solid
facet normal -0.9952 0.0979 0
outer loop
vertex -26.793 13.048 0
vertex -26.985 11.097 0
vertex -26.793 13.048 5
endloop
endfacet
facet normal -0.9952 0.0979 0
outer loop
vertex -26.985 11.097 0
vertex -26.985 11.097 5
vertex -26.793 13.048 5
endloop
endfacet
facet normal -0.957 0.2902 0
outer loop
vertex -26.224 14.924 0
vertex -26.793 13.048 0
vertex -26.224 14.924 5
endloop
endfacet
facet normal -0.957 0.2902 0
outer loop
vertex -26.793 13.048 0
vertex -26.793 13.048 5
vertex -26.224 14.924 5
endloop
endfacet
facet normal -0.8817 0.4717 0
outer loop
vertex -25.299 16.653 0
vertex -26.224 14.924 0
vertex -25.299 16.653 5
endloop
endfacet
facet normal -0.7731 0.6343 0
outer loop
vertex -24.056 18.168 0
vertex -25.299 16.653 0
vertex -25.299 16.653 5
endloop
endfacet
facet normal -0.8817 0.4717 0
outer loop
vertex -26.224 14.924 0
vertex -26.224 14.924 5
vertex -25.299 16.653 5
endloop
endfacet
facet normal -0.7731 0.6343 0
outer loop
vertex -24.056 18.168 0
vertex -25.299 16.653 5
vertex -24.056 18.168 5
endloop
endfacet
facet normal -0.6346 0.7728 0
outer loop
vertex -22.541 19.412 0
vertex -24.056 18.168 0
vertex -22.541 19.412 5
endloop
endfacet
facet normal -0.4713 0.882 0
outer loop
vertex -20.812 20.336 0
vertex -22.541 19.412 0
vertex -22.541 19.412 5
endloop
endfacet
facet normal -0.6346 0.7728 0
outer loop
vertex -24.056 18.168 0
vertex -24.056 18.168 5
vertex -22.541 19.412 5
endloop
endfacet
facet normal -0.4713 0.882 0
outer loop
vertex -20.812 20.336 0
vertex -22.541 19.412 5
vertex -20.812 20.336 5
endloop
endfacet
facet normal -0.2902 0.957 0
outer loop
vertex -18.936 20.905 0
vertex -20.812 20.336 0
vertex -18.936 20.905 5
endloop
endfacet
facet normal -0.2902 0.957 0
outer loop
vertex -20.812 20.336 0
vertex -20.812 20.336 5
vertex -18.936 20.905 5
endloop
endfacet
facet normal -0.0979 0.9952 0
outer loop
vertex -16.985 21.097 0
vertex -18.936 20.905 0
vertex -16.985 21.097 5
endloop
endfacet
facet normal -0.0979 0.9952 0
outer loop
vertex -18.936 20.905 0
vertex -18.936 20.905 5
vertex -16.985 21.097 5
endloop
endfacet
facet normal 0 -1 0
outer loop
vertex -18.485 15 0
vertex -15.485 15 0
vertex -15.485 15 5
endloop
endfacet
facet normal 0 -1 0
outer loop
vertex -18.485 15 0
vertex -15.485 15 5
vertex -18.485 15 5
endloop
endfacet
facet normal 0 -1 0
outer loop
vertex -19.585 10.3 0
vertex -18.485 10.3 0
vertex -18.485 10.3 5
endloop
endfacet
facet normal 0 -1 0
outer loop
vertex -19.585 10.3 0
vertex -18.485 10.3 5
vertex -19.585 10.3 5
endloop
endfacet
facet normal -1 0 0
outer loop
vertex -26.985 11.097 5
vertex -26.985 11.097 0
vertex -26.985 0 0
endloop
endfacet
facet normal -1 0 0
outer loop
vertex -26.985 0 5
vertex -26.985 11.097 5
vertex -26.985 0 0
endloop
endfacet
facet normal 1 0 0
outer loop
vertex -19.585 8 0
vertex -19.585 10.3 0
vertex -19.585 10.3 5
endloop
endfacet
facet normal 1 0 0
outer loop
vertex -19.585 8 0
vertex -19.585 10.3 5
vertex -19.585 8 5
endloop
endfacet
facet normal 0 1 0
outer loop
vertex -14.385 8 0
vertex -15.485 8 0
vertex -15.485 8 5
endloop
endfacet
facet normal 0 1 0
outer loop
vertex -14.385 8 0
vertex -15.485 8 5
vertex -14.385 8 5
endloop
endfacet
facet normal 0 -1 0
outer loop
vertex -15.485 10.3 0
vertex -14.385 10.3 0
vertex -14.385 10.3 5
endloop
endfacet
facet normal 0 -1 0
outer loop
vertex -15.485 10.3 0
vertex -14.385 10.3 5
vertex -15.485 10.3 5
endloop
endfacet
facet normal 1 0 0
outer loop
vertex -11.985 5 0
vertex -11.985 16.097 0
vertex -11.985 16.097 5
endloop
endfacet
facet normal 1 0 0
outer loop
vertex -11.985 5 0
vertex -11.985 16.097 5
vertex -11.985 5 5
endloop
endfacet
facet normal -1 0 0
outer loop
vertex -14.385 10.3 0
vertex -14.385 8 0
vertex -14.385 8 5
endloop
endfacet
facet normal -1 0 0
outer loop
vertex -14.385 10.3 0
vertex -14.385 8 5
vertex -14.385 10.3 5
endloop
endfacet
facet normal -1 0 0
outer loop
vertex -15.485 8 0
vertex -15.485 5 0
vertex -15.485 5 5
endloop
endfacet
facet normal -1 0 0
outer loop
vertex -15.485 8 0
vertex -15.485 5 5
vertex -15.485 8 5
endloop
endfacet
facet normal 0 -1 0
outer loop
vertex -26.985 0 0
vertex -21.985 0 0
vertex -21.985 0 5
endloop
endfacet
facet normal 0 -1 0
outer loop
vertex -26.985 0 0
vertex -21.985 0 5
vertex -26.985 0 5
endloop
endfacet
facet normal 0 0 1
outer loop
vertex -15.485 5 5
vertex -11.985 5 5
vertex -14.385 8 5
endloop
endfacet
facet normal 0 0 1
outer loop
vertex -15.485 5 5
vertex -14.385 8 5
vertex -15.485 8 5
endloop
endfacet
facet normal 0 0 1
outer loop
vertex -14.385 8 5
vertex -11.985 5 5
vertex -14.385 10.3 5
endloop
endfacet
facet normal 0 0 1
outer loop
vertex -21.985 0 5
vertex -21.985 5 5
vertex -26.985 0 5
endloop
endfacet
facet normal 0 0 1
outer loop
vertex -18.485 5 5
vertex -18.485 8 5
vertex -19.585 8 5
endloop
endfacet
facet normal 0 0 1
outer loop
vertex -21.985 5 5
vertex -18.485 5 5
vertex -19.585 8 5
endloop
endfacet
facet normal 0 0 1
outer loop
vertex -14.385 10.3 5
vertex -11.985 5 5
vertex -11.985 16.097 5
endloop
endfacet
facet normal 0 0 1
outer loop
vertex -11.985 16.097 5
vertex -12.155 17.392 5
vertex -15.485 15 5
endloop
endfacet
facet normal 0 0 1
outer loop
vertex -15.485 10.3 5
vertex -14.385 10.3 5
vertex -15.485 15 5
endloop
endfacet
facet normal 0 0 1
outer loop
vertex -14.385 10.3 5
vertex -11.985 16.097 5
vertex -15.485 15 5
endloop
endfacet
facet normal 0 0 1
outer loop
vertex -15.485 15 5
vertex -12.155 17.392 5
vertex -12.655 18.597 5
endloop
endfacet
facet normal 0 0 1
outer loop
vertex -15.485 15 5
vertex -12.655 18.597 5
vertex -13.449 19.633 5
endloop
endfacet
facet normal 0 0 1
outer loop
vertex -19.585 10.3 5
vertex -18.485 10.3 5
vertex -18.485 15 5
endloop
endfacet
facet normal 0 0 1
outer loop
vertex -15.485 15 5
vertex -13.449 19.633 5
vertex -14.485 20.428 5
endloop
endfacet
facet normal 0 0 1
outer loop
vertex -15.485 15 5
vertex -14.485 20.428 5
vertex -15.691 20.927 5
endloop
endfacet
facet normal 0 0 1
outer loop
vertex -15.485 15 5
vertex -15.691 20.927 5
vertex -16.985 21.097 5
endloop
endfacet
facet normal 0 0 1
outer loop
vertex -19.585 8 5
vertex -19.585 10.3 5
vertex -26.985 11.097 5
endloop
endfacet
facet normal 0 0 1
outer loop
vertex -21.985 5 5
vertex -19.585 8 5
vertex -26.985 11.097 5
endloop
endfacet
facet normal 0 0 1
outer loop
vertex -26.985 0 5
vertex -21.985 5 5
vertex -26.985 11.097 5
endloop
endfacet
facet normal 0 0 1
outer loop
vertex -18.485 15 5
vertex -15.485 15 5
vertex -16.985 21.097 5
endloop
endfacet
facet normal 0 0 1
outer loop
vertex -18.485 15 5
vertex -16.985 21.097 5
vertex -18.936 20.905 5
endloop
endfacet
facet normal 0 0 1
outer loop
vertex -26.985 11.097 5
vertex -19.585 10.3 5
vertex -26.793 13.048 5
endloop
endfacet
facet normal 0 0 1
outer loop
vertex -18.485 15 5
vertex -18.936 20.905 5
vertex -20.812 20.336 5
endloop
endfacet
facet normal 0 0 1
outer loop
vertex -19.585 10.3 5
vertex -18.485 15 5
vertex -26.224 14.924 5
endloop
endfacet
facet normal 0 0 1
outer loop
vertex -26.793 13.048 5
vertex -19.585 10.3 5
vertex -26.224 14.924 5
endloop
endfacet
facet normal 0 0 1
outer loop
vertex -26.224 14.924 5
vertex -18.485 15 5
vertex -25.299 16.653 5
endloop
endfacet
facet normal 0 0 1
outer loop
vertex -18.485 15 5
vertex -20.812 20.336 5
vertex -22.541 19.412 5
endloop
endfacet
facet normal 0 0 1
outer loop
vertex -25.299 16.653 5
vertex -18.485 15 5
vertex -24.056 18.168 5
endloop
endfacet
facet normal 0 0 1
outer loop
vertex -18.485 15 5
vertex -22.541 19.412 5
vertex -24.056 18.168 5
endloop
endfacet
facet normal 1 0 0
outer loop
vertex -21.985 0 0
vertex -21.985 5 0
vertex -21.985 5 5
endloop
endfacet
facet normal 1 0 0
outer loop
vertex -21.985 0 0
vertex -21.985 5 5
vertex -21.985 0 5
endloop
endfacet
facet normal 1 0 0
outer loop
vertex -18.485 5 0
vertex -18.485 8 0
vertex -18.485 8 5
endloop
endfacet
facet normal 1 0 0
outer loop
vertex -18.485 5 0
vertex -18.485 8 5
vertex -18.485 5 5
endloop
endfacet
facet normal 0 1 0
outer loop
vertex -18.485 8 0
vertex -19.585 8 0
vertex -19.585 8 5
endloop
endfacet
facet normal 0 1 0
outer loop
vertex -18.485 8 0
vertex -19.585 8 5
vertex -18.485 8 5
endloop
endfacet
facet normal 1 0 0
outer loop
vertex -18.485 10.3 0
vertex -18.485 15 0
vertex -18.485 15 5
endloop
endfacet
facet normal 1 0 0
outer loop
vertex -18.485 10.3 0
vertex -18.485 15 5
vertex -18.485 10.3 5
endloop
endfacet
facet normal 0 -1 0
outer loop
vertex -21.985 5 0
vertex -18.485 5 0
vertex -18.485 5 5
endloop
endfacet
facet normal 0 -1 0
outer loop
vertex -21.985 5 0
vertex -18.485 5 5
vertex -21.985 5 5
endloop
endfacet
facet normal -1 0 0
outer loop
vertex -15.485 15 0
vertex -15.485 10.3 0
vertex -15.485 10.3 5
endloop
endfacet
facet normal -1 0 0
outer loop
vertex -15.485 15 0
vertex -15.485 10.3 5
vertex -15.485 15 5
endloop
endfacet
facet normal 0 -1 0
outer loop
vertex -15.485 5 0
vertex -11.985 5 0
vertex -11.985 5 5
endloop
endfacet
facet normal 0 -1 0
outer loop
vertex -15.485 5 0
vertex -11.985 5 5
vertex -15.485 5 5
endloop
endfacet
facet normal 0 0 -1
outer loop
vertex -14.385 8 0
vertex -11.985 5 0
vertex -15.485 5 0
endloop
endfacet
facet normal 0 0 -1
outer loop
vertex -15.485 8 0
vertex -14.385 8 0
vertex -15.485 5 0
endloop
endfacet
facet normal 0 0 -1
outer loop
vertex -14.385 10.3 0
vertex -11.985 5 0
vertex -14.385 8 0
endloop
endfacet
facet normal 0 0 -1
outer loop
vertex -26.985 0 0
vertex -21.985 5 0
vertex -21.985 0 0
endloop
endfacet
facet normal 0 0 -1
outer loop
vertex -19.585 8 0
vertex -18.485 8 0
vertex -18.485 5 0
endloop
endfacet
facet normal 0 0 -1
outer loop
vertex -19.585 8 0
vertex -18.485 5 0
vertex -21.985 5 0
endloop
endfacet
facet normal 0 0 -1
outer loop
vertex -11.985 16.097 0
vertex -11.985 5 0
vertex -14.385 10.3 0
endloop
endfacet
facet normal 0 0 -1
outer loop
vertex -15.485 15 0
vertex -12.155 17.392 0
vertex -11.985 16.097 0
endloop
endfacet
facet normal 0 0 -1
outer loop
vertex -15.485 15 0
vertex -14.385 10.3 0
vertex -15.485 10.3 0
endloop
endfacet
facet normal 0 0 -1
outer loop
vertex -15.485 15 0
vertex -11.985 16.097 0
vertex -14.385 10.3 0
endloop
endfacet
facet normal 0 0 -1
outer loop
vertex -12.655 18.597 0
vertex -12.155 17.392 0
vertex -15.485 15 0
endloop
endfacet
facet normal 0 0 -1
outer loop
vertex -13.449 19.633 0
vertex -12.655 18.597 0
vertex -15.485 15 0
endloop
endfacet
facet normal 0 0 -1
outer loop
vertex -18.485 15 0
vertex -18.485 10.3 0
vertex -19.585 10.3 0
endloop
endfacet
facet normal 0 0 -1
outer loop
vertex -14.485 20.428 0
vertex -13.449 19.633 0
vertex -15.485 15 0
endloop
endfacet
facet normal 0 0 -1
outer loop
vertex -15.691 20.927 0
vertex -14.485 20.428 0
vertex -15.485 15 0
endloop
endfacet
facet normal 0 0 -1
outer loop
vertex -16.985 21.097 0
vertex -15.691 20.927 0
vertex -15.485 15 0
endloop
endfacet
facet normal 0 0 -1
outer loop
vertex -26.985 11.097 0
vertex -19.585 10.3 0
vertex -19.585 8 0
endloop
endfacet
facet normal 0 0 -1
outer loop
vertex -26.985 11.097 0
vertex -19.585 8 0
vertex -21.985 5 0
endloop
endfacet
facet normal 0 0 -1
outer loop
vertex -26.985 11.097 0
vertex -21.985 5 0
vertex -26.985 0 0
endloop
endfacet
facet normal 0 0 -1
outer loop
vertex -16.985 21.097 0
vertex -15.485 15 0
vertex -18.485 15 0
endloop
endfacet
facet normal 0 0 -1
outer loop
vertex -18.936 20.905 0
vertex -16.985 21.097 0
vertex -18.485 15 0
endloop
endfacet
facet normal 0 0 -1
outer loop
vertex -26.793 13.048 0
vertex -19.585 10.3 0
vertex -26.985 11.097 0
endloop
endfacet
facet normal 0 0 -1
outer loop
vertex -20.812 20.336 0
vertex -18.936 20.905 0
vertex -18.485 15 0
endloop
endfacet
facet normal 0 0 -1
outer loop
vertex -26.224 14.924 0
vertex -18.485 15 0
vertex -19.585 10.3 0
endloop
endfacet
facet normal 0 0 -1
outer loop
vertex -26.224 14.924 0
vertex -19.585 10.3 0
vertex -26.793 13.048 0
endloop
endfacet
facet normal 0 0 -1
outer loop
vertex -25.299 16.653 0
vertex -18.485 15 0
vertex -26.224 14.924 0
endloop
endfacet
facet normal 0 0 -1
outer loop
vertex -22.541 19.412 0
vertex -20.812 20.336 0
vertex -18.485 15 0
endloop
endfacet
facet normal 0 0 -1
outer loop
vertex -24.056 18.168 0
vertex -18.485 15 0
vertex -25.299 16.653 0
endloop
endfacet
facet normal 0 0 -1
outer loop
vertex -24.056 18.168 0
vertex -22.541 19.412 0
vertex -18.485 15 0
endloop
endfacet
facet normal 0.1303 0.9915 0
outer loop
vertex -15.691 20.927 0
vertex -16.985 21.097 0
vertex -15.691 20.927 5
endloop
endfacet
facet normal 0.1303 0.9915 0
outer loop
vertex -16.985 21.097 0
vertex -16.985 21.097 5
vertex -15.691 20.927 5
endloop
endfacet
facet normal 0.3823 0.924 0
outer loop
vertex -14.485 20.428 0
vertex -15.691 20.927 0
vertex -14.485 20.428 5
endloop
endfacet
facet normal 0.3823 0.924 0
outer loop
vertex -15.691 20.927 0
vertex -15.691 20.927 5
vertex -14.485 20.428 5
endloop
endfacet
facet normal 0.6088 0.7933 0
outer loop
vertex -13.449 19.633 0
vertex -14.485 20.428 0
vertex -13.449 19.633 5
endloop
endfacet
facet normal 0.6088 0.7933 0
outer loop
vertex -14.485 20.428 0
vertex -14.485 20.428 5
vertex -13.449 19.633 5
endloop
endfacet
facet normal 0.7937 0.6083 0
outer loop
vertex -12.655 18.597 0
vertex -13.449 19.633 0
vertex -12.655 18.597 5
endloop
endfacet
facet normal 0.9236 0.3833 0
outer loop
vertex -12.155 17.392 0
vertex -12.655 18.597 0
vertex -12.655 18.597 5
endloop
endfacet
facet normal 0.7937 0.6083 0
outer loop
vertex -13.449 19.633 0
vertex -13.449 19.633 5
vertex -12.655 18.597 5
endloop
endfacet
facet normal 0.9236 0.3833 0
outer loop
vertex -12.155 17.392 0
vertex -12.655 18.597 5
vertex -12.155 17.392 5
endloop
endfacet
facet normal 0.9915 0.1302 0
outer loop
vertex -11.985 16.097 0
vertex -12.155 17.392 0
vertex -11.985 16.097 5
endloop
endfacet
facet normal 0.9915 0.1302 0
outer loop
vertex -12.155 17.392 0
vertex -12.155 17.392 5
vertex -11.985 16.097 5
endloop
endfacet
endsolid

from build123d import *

# Parameters (mm, degrees)
BOSS_EXTRUDE1_DEPTH = 5
FILLET1_R           = 10
FILLET2_R           = 5


with BuildPart() as part:
    # Sketch1 → Boss-Extrude1 (new body)
    with BuildSketch(Plane.XY):
        Polygon((-18.484799863, 5), (-21.984799863, 5), (-21.984799863, 0), (-26.984799863, 0), (-26.984799863, 5), (-26.984799863, 21.097384909), (-11.984799863, 21.097384909), (-11.984799863, 5), (-15.484799863, 5), (-15.484799863, 8), (-14.384799863, 8), (-14.384799863, 10.3), (-15.484799863, 10.3), (-15.484799863, 15), (-18.484799863, 15), (-18.484799863, 10.3), (-19.584799863, 10.3), (-19.584799863, 8), (-18.484799863, 8), align=None)
    extrude(amount=BOSS_EXTRUDE1_DEPTH)

    # Fillet1
    fillet1_edges = [part.edges().sort_by_distance(p)[0] for p in [
        (-26.984799863, 21.097384909, 2.5),
    ]]
    fillet(fillet1_edges, radius=FILLET1_R)

    # Fillet2
    fillet2_edges = [part.edges().sort_by_distance(p)[0] for p in [
        (-11.984799863, 21.097384909, 2.5),
    ]]
    fillet(fillet2_edges, radius=FILLET2_R - 0.0001)  # a hair under: the kernel refuses the full size


solid = part.part
